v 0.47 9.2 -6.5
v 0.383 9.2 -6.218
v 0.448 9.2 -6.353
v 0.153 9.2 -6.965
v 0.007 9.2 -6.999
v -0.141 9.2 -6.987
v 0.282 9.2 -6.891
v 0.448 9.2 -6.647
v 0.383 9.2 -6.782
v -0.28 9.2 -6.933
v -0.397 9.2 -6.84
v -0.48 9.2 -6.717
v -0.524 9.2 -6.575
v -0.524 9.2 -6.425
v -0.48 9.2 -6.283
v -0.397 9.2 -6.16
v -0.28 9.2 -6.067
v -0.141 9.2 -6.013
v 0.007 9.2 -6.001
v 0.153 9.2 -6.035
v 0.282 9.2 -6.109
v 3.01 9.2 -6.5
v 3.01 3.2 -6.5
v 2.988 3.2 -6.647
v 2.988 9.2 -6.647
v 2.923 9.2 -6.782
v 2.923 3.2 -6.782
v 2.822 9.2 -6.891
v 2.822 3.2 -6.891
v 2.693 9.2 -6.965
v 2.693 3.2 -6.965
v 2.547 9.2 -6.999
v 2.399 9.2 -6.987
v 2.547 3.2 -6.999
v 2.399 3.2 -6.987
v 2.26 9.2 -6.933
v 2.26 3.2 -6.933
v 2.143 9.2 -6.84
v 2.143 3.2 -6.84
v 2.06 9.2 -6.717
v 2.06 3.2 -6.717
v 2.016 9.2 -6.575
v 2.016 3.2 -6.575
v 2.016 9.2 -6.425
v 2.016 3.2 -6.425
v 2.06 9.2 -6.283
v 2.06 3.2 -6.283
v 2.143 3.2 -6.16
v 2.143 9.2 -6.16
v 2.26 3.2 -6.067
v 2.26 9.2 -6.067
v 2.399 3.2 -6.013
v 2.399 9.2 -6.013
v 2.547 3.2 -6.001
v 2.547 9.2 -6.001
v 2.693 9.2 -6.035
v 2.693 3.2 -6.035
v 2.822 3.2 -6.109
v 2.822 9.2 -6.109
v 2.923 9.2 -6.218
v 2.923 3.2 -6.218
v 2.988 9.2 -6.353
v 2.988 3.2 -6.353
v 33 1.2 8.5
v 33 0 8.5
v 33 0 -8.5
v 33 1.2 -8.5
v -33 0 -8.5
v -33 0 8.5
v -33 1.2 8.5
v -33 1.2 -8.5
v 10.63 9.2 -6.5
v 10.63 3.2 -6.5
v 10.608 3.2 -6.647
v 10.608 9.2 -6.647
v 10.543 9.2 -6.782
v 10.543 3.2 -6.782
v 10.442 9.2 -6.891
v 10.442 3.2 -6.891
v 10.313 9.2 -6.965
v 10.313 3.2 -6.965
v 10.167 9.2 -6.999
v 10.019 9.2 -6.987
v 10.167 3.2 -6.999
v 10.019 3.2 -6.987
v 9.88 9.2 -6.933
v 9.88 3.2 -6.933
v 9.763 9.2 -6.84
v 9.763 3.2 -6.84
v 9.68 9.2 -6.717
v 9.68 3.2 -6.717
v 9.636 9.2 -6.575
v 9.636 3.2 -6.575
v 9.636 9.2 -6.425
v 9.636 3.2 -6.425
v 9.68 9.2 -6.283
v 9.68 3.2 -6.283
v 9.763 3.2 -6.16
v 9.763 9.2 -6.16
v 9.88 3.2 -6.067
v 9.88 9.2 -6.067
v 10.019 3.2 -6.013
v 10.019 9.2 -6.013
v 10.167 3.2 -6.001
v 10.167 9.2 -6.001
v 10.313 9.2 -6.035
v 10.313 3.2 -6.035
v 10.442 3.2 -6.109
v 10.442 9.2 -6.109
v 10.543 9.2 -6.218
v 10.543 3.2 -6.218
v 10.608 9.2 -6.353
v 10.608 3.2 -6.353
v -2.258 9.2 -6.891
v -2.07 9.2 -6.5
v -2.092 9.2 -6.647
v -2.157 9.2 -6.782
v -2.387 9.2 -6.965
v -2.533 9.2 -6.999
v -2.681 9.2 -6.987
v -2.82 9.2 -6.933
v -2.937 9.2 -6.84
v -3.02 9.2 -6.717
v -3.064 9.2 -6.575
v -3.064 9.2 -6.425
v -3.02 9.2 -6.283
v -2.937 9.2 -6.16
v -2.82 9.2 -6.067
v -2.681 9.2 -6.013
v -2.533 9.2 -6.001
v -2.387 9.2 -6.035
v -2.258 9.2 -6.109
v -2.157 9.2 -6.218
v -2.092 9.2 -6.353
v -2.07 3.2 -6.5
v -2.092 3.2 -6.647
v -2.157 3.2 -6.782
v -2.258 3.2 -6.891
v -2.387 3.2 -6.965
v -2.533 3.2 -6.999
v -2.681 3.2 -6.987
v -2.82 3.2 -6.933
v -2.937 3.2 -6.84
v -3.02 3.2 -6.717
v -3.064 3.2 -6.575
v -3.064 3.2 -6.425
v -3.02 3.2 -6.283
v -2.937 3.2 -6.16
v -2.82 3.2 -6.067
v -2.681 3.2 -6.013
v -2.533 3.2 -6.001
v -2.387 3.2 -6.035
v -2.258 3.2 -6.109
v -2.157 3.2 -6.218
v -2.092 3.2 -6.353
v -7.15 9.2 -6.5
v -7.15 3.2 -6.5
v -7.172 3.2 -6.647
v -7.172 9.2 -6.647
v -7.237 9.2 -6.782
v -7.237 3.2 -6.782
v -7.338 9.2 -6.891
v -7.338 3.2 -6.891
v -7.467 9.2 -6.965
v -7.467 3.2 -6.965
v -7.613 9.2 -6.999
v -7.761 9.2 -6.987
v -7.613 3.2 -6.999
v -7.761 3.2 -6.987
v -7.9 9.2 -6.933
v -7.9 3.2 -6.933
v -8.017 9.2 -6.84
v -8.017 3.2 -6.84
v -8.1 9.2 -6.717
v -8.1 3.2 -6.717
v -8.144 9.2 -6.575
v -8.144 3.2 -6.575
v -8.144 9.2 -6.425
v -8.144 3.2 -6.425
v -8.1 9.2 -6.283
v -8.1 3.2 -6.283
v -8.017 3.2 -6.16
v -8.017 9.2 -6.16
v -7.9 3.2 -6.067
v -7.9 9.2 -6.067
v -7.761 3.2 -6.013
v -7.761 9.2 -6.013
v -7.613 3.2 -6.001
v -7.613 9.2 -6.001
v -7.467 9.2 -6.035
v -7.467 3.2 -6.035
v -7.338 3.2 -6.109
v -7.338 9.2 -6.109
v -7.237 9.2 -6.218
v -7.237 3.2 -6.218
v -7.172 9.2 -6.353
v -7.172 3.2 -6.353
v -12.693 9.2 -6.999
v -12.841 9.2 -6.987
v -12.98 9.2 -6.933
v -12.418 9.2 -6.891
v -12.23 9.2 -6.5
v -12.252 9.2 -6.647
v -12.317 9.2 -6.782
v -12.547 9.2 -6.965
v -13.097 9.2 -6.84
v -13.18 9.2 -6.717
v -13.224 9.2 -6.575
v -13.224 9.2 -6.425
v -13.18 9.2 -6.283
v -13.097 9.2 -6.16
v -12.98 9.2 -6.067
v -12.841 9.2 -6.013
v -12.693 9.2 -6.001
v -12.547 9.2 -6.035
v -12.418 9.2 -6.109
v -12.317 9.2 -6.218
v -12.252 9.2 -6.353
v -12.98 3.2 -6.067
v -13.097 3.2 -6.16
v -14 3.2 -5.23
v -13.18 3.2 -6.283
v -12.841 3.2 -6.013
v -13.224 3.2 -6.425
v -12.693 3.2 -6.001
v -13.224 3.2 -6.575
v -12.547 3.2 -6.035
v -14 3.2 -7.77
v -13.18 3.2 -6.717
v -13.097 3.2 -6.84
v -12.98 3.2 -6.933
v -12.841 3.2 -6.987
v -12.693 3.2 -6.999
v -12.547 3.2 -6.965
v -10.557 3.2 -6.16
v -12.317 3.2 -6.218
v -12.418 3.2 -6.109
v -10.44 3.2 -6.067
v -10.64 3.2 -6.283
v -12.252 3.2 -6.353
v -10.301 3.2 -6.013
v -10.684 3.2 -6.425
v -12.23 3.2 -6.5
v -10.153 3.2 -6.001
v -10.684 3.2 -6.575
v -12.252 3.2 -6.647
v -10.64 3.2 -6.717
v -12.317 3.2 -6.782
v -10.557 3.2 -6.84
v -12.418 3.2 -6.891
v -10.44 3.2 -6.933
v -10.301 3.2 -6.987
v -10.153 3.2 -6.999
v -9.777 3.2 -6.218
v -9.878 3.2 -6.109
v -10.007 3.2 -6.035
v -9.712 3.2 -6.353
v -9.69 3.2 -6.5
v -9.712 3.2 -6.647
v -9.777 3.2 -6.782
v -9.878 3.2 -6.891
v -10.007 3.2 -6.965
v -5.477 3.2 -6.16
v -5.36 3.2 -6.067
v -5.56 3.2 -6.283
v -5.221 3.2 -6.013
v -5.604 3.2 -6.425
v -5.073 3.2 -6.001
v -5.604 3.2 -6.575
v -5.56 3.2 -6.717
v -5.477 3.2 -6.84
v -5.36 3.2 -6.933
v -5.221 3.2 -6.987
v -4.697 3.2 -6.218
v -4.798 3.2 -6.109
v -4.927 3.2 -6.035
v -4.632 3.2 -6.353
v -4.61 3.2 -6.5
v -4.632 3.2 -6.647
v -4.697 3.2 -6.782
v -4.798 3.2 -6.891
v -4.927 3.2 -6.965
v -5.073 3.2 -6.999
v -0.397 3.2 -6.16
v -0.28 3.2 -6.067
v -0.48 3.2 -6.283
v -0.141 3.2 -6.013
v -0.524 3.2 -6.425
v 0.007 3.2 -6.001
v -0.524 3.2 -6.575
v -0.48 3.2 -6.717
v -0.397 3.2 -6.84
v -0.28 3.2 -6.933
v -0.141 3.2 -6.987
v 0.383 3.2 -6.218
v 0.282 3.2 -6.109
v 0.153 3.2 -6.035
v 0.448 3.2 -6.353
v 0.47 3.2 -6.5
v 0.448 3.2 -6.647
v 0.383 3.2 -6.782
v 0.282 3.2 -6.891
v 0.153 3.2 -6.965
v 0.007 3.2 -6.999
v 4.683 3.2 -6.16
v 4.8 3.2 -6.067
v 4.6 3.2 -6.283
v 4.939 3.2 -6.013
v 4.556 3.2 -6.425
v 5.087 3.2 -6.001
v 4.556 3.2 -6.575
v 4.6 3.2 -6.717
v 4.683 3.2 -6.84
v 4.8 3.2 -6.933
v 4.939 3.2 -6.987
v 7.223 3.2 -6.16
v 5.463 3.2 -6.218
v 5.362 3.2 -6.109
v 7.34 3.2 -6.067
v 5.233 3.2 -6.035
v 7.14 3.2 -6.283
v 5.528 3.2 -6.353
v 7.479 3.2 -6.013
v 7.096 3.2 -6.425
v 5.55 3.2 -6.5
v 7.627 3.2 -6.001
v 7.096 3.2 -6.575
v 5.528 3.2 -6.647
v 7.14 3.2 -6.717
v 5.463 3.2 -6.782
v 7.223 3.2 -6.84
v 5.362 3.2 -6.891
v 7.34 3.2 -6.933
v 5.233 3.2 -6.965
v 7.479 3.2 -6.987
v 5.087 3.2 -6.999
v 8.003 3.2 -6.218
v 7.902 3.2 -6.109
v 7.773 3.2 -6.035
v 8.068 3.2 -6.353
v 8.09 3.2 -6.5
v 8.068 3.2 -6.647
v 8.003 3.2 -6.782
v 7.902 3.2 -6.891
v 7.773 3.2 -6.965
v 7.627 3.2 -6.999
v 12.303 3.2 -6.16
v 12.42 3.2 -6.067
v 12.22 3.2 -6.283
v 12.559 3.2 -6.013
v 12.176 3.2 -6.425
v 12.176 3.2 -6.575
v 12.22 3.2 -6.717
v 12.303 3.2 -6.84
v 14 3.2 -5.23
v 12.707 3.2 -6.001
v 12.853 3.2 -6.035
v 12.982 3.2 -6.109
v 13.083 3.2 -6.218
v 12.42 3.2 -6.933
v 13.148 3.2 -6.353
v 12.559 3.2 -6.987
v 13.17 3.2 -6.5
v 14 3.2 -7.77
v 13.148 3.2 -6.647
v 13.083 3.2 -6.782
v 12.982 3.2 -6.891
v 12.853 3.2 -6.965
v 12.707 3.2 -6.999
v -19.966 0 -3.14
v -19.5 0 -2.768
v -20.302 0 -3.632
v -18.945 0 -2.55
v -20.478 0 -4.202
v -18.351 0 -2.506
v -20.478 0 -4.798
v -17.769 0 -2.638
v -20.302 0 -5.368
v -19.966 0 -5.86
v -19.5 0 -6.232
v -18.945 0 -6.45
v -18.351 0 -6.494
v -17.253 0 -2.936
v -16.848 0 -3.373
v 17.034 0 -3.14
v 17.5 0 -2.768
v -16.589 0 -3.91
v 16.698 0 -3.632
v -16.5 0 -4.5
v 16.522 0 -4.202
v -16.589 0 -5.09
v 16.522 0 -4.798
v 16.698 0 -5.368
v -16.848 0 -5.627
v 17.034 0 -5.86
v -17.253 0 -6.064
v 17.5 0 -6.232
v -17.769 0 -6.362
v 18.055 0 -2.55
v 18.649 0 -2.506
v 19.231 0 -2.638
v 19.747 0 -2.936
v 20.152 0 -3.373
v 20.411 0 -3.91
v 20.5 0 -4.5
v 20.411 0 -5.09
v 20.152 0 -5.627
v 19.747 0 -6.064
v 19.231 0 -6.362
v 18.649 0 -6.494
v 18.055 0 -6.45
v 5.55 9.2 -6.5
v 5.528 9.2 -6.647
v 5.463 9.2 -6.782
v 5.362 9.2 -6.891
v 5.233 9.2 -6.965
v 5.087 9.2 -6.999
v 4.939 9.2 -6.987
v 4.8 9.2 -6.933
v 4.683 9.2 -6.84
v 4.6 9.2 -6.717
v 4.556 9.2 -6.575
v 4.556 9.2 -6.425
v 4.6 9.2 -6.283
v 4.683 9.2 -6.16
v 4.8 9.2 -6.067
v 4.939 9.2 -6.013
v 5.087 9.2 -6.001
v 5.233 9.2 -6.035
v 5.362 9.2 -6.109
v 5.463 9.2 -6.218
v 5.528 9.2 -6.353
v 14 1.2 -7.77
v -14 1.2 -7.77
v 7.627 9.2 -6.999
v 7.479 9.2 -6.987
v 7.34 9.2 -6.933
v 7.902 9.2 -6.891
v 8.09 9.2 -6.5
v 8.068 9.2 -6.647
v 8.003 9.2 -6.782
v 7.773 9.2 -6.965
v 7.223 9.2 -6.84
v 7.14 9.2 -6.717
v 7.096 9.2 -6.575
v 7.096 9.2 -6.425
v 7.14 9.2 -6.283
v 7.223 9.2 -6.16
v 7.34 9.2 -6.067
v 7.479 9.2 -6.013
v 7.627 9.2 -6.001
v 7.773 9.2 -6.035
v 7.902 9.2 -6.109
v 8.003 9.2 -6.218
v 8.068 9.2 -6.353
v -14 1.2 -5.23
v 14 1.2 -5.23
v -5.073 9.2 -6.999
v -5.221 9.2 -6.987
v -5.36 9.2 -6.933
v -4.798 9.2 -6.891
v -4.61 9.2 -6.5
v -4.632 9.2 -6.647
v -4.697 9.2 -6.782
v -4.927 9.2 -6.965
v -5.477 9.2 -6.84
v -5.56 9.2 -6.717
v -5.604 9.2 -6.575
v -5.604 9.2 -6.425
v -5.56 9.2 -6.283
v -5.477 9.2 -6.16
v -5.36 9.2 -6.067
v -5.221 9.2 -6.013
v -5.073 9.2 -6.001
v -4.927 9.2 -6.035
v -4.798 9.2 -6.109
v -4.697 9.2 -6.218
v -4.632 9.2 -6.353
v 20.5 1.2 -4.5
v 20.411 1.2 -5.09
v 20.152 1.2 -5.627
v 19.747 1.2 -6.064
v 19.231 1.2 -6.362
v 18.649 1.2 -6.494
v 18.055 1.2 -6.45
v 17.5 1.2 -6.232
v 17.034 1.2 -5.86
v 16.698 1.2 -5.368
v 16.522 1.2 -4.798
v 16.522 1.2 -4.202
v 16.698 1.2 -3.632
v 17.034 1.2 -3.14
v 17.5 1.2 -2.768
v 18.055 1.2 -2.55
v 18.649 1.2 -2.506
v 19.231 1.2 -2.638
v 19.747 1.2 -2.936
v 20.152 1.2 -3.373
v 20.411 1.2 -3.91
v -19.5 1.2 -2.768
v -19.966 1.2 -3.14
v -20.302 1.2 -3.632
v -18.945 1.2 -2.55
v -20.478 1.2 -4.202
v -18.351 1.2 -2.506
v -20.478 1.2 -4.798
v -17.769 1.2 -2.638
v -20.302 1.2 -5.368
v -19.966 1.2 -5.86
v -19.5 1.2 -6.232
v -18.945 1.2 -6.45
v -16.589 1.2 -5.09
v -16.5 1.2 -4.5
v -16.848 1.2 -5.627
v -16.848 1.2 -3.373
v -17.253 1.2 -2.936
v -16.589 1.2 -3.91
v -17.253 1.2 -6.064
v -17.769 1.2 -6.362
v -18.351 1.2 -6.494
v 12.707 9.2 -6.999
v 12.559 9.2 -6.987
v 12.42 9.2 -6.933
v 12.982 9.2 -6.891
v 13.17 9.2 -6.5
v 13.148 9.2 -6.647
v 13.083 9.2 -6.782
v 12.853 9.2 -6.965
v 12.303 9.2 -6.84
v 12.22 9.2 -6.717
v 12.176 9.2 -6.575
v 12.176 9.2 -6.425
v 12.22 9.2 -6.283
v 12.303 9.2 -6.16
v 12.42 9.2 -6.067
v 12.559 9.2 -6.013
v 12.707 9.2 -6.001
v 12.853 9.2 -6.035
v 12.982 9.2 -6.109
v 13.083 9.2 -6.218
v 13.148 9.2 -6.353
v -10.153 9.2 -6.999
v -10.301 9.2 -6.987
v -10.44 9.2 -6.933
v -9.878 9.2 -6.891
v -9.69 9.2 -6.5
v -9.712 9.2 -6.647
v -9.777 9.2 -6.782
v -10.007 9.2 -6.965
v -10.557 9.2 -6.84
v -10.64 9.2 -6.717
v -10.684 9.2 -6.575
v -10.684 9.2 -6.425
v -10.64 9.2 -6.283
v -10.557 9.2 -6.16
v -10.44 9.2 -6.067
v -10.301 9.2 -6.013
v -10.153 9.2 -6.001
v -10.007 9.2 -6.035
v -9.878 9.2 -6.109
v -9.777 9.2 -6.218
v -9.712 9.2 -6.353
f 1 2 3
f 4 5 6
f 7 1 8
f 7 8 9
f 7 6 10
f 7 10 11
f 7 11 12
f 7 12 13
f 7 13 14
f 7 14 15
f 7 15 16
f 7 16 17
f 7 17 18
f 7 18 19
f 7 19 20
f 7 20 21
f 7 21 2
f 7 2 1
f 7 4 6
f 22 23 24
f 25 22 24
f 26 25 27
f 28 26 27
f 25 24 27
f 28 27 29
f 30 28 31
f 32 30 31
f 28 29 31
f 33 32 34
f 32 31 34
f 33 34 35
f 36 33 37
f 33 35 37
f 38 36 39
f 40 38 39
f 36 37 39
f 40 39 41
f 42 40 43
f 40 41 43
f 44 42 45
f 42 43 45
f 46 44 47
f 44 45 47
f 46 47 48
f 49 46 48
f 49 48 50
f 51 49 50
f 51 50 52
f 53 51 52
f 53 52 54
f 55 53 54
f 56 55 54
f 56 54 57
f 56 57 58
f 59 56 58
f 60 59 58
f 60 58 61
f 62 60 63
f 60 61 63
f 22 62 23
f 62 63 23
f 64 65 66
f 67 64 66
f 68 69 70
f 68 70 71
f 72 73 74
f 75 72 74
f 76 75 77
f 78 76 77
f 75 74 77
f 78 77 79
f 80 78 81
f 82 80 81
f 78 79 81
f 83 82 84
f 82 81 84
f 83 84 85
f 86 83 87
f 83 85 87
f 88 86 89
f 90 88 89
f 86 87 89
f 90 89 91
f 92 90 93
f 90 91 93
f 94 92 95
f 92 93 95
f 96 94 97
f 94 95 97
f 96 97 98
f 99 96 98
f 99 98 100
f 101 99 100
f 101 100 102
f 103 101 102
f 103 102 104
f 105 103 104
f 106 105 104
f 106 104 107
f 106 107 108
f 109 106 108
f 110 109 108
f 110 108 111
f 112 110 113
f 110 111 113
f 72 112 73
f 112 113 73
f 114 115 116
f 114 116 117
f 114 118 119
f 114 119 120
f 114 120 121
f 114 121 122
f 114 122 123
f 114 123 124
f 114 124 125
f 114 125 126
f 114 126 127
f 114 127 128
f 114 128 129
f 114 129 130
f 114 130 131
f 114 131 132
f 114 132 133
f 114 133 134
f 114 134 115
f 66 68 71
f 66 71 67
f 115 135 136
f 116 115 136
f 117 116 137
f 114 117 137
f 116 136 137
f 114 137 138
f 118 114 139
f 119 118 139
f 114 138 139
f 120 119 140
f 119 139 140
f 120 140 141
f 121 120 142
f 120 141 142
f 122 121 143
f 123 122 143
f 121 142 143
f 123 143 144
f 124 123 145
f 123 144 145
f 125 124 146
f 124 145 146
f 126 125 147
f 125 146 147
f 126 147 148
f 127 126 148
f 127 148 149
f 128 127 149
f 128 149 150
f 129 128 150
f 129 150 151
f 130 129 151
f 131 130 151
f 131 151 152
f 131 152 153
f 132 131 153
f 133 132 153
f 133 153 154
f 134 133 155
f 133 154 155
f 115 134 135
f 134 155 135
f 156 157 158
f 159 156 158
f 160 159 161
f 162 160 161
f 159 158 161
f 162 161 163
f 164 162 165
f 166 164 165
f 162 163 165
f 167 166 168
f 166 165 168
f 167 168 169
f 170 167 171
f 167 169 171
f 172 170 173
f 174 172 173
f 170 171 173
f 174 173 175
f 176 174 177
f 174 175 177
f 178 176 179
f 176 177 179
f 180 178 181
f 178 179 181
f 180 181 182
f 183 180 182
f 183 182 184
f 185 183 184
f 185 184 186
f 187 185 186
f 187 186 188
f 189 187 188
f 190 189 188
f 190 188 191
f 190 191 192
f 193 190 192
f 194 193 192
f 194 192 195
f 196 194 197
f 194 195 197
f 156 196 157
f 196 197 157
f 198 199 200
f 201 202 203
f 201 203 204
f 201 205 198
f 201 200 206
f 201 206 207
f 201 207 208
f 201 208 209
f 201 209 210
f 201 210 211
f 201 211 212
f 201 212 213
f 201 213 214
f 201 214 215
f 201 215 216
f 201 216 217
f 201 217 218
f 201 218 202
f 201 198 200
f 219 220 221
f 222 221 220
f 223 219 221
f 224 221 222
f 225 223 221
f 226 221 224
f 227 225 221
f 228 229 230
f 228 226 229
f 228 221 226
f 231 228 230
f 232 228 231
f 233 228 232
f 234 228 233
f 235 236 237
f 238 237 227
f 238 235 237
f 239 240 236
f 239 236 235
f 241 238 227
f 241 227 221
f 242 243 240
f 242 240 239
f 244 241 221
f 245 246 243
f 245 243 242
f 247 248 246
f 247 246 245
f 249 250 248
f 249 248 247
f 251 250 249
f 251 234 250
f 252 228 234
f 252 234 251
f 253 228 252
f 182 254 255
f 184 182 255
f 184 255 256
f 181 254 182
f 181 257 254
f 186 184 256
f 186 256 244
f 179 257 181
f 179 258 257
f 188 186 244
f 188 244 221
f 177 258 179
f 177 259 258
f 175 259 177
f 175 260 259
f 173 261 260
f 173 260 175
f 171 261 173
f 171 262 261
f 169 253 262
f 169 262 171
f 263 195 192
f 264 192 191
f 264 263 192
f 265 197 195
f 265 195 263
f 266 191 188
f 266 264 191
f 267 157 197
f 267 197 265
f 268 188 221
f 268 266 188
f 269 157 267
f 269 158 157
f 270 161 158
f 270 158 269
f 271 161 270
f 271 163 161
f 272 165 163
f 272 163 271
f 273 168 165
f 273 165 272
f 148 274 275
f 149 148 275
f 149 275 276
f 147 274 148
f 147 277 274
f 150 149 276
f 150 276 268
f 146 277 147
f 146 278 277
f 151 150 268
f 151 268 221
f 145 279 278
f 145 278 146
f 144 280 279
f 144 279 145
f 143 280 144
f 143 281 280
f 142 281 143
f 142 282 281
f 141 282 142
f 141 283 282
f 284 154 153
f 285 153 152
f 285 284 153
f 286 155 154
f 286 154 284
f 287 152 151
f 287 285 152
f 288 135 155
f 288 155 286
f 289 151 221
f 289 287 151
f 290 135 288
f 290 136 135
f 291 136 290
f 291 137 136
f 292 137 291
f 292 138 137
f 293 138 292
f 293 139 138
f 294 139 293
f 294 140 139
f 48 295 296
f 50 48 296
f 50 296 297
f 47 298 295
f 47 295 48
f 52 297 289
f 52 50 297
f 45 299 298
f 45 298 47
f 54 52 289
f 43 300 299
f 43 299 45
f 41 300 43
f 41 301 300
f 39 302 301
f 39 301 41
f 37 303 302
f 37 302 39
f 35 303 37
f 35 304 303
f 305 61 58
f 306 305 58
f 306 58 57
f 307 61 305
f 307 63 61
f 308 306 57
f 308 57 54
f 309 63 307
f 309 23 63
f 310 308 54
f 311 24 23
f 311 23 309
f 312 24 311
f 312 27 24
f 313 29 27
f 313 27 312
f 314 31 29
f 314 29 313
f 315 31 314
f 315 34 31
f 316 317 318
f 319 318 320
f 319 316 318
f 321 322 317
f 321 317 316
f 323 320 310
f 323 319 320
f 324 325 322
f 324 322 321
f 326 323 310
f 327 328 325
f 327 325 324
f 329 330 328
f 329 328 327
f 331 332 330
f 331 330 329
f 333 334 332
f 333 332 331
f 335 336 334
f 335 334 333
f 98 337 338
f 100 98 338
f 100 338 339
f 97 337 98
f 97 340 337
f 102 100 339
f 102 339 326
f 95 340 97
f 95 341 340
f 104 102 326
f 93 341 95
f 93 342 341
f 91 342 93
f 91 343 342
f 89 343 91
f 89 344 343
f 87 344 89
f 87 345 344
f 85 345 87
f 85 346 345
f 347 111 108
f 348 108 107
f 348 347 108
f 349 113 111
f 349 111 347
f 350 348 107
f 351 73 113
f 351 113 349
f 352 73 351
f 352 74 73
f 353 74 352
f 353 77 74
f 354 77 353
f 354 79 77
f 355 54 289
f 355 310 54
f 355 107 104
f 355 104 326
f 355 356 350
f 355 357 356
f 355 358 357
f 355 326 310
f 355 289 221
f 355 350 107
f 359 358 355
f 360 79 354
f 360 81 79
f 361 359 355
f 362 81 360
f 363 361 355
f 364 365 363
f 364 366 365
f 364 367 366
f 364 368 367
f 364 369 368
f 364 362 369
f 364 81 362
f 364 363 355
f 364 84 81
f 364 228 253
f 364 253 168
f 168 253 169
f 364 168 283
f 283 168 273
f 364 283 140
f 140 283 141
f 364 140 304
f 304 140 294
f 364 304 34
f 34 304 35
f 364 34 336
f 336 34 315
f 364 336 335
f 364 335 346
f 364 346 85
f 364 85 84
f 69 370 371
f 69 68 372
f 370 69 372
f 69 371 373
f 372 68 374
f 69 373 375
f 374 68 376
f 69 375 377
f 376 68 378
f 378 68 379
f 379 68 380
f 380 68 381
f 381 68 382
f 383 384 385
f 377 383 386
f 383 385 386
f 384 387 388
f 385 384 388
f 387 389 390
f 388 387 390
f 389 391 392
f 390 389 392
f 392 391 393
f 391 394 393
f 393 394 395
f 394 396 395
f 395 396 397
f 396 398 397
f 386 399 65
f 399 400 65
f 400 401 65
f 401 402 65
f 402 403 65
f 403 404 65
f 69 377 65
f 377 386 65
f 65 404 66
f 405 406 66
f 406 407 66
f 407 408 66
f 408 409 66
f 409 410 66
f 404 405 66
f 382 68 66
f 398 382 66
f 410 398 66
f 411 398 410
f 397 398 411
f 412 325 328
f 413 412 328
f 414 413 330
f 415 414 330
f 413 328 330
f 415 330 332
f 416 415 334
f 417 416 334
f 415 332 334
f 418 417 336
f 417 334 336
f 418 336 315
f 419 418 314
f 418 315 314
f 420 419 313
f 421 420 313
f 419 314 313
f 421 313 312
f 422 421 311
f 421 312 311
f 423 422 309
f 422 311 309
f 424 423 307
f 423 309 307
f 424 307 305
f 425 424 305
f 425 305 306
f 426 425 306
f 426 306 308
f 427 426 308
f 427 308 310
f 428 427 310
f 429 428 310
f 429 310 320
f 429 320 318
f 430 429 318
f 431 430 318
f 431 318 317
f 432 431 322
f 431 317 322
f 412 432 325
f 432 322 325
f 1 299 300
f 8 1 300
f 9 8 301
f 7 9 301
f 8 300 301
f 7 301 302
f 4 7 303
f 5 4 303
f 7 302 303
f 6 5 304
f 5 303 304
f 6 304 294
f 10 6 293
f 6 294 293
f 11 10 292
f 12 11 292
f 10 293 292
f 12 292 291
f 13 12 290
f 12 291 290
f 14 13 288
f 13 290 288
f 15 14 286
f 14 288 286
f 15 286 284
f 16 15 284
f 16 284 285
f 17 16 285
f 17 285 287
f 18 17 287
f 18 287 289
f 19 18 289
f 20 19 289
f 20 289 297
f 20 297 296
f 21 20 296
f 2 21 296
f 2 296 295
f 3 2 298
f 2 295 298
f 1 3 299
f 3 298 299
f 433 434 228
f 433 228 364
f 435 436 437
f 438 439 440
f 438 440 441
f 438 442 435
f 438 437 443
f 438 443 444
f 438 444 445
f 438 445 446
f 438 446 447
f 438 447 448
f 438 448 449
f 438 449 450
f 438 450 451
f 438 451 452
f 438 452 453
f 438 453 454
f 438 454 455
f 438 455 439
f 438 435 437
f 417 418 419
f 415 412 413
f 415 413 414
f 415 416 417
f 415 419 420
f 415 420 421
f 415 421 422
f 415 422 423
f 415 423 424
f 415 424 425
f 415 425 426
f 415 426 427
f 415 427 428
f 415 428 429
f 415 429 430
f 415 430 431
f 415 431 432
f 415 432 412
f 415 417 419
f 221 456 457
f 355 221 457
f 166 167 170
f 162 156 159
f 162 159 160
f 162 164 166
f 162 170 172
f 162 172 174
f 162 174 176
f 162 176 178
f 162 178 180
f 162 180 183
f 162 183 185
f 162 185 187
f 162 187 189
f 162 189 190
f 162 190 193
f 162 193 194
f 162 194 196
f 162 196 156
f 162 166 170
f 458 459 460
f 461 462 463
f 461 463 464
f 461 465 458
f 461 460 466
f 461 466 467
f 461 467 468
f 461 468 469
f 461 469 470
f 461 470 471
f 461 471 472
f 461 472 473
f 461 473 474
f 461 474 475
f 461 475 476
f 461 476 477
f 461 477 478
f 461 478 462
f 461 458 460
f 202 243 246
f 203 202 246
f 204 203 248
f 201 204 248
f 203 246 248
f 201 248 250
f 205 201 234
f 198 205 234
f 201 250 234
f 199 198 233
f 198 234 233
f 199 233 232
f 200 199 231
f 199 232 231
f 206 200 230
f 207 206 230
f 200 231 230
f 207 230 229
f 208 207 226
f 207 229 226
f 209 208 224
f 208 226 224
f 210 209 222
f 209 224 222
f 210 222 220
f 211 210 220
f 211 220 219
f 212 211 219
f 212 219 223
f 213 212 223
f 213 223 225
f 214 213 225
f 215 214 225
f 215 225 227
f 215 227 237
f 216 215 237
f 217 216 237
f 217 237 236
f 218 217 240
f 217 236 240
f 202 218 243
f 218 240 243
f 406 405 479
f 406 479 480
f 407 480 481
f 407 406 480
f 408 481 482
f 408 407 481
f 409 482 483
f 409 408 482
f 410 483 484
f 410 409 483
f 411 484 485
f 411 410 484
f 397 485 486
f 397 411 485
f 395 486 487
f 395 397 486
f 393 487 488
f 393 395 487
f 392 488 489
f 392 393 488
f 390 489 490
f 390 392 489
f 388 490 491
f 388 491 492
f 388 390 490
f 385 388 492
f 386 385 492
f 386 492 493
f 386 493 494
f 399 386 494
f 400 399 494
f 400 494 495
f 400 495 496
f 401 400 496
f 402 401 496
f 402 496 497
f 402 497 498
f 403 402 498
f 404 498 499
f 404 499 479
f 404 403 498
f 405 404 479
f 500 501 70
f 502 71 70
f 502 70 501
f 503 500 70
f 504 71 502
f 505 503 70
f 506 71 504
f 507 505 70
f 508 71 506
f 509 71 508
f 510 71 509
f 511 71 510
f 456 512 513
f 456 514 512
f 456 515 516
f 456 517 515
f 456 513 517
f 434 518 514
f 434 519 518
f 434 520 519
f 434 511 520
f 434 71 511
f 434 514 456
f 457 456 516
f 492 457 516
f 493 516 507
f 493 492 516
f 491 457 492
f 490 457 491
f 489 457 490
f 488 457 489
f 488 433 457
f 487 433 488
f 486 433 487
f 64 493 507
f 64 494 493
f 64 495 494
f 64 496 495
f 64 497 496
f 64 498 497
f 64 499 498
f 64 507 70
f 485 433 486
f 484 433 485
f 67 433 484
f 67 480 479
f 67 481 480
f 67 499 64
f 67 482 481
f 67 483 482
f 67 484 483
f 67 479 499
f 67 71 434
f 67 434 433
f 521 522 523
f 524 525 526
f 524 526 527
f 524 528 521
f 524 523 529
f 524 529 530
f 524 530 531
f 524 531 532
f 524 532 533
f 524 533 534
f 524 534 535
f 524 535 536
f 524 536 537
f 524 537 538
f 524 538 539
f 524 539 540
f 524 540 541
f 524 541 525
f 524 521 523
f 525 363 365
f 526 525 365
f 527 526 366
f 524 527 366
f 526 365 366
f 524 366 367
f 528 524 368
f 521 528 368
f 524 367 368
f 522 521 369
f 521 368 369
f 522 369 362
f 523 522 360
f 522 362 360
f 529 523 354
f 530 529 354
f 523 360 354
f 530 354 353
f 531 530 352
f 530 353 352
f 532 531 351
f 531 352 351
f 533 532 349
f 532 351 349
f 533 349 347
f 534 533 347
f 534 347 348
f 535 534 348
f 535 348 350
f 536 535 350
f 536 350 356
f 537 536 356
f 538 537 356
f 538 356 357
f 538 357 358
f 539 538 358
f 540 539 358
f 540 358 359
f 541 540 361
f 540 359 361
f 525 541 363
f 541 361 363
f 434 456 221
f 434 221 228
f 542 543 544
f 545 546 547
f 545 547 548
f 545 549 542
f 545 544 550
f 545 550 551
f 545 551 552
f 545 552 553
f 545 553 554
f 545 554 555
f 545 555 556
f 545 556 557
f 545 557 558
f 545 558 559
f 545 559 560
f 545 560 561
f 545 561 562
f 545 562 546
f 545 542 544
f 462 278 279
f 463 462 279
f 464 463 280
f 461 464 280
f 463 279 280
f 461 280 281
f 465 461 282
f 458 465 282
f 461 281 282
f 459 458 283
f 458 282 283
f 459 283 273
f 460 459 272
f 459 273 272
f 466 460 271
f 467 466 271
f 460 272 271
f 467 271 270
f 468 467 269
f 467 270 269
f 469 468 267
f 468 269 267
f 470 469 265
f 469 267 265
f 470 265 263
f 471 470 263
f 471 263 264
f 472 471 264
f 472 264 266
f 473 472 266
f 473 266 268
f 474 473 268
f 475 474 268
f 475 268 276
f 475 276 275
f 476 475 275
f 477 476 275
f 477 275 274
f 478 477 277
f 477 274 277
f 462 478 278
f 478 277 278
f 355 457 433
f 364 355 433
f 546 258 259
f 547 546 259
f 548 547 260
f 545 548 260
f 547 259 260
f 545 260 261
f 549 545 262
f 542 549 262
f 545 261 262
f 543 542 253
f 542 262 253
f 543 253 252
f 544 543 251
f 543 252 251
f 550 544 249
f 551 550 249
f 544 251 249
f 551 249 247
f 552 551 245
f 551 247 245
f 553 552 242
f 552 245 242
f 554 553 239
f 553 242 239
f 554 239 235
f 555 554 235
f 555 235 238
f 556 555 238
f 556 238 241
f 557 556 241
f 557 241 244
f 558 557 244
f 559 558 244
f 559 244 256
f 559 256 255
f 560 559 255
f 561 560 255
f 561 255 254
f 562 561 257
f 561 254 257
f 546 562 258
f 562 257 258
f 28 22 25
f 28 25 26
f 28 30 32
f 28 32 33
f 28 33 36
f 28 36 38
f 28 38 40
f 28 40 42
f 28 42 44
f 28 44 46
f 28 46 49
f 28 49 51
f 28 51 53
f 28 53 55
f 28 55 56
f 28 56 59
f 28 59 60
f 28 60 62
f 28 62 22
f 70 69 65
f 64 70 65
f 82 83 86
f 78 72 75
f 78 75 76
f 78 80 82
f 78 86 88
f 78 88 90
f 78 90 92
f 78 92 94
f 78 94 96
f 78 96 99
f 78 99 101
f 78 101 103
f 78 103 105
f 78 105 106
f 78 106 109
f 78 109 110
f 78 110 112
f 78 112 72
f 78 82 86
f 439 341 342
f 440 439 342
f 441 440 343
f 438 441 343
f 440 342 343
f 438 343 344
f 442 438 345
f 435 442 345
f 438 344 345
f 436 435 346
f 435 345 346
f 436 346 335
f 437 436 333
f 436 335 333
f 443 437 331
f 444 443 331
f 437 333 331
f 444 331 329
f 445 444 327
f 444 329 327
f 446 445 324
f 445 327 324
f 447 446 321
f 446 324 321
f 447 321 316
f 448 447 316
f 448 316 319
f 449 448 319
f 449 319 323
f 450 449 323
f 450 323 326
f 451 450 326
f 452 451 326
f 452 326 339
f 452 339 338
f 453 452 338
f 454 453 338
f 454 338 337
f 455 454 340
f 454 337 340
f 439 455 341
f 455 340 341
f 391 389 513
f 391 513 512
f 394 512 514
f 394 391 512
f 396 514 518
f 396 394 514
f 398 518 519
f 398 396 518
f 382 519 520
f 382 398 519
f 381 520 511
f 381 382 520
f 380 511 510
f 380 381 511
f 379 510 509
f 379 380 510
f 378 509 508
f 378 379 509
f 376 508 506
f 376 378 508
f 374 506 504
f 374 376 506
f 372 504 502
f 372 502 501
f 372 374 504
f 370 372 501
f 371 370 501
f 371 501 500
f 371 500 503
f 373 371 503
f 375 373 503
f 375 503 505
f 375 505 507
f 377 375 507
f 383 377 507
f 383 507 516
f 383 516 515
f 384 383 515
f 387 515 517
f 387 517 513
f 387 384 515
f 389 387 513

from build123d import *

# Parameters (mm, degrees)
SKETCH1_W           = 66
SKETCH1_H           = 17
SKETCH1_R           = 2
BOSS_EXTRUDE1_DEPTH = 1.2
SKETCH2_W           = 28
SKETCH2_H           = 2.54
BOSS_EXTRUDE2_DEPTH = 2
SKETCH3_R           = 0.5
BOSS_EXTRUDE3_DEPTH = 6


with BuildPart() as part:
    # Sketch1 → Boss-Extrude1 (new body)
    with BuildSketch(Plane(origin=(0, 0, 0), x_dir=(1, 0, 0), z_dir=(0, 1, 0))):
        Rectangle(SKETCH1_W, SKETCH1_H)
        with Locations((18.5, 4.5)):
            Circle(SKETCH1_R, mode=Mode.SUBTRACT)
        with Locations((-18.5, 4.5)):
            Circle(SKETCH1_R, mode=Mode.SUBTRACT)
    extrude(amount=BOSS_EXTRUDE1_DEPTH)

    # Sketch2 → Boss-Extrude2 (add)
    with BuildSketch(Plane(origin=(0, 1.2, 0), x_dir=(1, 0, 0), z_dir=(0, 1, 0))):
        with Locations((0, 6.5)):
            Rectangle(SKETCH2_W, SKETCH2_H)
    extrude(amount=BOSS_EXTRUDE2_DEPTH)

    # Sketch3 → Boss-Extrude3 (add)
    with BuildSketch(Plane(origin=(0, 3.2, 0), x_dir=(1, 0, 0), z_dir=(0, 1, 0))):
        with Locations((-12.73, 6.5)):
            Circle(SKETCH3_R)
        with Locations((-10.19, 6.5)):
            Circle(SKETCH3_R)
        with Locations((-7.65, 6.5)):
            Circle(SKETCH3_R)
        with Locations((-5.11, 6.5)):
            Circle(SKETCH3_R)
        with Locations((-2.57, 6.5)):
            Circle(SKETCH3_R)
        with Locations((-0.03, 6.5)):
            Circle(SKETCH3_R)
        with Locations((2.51, 6.5)):
            Circle(SKETCH3_R)
        with Locations((5.05, 6.5)):
            Circle(SKETCH3_R)
        with Locations((7.59, 6.5)):
            Circle(SKETCH3_R)
        with Locations((10.13, 6.5)):
            Circle(SKETCH3_R)
        with Locations((12.67, 6.5)):
            Circle(SKETCH3_R)
    extrude(amount=BOSS_EXTRUDE3_DEPTH)


solid = part.part
